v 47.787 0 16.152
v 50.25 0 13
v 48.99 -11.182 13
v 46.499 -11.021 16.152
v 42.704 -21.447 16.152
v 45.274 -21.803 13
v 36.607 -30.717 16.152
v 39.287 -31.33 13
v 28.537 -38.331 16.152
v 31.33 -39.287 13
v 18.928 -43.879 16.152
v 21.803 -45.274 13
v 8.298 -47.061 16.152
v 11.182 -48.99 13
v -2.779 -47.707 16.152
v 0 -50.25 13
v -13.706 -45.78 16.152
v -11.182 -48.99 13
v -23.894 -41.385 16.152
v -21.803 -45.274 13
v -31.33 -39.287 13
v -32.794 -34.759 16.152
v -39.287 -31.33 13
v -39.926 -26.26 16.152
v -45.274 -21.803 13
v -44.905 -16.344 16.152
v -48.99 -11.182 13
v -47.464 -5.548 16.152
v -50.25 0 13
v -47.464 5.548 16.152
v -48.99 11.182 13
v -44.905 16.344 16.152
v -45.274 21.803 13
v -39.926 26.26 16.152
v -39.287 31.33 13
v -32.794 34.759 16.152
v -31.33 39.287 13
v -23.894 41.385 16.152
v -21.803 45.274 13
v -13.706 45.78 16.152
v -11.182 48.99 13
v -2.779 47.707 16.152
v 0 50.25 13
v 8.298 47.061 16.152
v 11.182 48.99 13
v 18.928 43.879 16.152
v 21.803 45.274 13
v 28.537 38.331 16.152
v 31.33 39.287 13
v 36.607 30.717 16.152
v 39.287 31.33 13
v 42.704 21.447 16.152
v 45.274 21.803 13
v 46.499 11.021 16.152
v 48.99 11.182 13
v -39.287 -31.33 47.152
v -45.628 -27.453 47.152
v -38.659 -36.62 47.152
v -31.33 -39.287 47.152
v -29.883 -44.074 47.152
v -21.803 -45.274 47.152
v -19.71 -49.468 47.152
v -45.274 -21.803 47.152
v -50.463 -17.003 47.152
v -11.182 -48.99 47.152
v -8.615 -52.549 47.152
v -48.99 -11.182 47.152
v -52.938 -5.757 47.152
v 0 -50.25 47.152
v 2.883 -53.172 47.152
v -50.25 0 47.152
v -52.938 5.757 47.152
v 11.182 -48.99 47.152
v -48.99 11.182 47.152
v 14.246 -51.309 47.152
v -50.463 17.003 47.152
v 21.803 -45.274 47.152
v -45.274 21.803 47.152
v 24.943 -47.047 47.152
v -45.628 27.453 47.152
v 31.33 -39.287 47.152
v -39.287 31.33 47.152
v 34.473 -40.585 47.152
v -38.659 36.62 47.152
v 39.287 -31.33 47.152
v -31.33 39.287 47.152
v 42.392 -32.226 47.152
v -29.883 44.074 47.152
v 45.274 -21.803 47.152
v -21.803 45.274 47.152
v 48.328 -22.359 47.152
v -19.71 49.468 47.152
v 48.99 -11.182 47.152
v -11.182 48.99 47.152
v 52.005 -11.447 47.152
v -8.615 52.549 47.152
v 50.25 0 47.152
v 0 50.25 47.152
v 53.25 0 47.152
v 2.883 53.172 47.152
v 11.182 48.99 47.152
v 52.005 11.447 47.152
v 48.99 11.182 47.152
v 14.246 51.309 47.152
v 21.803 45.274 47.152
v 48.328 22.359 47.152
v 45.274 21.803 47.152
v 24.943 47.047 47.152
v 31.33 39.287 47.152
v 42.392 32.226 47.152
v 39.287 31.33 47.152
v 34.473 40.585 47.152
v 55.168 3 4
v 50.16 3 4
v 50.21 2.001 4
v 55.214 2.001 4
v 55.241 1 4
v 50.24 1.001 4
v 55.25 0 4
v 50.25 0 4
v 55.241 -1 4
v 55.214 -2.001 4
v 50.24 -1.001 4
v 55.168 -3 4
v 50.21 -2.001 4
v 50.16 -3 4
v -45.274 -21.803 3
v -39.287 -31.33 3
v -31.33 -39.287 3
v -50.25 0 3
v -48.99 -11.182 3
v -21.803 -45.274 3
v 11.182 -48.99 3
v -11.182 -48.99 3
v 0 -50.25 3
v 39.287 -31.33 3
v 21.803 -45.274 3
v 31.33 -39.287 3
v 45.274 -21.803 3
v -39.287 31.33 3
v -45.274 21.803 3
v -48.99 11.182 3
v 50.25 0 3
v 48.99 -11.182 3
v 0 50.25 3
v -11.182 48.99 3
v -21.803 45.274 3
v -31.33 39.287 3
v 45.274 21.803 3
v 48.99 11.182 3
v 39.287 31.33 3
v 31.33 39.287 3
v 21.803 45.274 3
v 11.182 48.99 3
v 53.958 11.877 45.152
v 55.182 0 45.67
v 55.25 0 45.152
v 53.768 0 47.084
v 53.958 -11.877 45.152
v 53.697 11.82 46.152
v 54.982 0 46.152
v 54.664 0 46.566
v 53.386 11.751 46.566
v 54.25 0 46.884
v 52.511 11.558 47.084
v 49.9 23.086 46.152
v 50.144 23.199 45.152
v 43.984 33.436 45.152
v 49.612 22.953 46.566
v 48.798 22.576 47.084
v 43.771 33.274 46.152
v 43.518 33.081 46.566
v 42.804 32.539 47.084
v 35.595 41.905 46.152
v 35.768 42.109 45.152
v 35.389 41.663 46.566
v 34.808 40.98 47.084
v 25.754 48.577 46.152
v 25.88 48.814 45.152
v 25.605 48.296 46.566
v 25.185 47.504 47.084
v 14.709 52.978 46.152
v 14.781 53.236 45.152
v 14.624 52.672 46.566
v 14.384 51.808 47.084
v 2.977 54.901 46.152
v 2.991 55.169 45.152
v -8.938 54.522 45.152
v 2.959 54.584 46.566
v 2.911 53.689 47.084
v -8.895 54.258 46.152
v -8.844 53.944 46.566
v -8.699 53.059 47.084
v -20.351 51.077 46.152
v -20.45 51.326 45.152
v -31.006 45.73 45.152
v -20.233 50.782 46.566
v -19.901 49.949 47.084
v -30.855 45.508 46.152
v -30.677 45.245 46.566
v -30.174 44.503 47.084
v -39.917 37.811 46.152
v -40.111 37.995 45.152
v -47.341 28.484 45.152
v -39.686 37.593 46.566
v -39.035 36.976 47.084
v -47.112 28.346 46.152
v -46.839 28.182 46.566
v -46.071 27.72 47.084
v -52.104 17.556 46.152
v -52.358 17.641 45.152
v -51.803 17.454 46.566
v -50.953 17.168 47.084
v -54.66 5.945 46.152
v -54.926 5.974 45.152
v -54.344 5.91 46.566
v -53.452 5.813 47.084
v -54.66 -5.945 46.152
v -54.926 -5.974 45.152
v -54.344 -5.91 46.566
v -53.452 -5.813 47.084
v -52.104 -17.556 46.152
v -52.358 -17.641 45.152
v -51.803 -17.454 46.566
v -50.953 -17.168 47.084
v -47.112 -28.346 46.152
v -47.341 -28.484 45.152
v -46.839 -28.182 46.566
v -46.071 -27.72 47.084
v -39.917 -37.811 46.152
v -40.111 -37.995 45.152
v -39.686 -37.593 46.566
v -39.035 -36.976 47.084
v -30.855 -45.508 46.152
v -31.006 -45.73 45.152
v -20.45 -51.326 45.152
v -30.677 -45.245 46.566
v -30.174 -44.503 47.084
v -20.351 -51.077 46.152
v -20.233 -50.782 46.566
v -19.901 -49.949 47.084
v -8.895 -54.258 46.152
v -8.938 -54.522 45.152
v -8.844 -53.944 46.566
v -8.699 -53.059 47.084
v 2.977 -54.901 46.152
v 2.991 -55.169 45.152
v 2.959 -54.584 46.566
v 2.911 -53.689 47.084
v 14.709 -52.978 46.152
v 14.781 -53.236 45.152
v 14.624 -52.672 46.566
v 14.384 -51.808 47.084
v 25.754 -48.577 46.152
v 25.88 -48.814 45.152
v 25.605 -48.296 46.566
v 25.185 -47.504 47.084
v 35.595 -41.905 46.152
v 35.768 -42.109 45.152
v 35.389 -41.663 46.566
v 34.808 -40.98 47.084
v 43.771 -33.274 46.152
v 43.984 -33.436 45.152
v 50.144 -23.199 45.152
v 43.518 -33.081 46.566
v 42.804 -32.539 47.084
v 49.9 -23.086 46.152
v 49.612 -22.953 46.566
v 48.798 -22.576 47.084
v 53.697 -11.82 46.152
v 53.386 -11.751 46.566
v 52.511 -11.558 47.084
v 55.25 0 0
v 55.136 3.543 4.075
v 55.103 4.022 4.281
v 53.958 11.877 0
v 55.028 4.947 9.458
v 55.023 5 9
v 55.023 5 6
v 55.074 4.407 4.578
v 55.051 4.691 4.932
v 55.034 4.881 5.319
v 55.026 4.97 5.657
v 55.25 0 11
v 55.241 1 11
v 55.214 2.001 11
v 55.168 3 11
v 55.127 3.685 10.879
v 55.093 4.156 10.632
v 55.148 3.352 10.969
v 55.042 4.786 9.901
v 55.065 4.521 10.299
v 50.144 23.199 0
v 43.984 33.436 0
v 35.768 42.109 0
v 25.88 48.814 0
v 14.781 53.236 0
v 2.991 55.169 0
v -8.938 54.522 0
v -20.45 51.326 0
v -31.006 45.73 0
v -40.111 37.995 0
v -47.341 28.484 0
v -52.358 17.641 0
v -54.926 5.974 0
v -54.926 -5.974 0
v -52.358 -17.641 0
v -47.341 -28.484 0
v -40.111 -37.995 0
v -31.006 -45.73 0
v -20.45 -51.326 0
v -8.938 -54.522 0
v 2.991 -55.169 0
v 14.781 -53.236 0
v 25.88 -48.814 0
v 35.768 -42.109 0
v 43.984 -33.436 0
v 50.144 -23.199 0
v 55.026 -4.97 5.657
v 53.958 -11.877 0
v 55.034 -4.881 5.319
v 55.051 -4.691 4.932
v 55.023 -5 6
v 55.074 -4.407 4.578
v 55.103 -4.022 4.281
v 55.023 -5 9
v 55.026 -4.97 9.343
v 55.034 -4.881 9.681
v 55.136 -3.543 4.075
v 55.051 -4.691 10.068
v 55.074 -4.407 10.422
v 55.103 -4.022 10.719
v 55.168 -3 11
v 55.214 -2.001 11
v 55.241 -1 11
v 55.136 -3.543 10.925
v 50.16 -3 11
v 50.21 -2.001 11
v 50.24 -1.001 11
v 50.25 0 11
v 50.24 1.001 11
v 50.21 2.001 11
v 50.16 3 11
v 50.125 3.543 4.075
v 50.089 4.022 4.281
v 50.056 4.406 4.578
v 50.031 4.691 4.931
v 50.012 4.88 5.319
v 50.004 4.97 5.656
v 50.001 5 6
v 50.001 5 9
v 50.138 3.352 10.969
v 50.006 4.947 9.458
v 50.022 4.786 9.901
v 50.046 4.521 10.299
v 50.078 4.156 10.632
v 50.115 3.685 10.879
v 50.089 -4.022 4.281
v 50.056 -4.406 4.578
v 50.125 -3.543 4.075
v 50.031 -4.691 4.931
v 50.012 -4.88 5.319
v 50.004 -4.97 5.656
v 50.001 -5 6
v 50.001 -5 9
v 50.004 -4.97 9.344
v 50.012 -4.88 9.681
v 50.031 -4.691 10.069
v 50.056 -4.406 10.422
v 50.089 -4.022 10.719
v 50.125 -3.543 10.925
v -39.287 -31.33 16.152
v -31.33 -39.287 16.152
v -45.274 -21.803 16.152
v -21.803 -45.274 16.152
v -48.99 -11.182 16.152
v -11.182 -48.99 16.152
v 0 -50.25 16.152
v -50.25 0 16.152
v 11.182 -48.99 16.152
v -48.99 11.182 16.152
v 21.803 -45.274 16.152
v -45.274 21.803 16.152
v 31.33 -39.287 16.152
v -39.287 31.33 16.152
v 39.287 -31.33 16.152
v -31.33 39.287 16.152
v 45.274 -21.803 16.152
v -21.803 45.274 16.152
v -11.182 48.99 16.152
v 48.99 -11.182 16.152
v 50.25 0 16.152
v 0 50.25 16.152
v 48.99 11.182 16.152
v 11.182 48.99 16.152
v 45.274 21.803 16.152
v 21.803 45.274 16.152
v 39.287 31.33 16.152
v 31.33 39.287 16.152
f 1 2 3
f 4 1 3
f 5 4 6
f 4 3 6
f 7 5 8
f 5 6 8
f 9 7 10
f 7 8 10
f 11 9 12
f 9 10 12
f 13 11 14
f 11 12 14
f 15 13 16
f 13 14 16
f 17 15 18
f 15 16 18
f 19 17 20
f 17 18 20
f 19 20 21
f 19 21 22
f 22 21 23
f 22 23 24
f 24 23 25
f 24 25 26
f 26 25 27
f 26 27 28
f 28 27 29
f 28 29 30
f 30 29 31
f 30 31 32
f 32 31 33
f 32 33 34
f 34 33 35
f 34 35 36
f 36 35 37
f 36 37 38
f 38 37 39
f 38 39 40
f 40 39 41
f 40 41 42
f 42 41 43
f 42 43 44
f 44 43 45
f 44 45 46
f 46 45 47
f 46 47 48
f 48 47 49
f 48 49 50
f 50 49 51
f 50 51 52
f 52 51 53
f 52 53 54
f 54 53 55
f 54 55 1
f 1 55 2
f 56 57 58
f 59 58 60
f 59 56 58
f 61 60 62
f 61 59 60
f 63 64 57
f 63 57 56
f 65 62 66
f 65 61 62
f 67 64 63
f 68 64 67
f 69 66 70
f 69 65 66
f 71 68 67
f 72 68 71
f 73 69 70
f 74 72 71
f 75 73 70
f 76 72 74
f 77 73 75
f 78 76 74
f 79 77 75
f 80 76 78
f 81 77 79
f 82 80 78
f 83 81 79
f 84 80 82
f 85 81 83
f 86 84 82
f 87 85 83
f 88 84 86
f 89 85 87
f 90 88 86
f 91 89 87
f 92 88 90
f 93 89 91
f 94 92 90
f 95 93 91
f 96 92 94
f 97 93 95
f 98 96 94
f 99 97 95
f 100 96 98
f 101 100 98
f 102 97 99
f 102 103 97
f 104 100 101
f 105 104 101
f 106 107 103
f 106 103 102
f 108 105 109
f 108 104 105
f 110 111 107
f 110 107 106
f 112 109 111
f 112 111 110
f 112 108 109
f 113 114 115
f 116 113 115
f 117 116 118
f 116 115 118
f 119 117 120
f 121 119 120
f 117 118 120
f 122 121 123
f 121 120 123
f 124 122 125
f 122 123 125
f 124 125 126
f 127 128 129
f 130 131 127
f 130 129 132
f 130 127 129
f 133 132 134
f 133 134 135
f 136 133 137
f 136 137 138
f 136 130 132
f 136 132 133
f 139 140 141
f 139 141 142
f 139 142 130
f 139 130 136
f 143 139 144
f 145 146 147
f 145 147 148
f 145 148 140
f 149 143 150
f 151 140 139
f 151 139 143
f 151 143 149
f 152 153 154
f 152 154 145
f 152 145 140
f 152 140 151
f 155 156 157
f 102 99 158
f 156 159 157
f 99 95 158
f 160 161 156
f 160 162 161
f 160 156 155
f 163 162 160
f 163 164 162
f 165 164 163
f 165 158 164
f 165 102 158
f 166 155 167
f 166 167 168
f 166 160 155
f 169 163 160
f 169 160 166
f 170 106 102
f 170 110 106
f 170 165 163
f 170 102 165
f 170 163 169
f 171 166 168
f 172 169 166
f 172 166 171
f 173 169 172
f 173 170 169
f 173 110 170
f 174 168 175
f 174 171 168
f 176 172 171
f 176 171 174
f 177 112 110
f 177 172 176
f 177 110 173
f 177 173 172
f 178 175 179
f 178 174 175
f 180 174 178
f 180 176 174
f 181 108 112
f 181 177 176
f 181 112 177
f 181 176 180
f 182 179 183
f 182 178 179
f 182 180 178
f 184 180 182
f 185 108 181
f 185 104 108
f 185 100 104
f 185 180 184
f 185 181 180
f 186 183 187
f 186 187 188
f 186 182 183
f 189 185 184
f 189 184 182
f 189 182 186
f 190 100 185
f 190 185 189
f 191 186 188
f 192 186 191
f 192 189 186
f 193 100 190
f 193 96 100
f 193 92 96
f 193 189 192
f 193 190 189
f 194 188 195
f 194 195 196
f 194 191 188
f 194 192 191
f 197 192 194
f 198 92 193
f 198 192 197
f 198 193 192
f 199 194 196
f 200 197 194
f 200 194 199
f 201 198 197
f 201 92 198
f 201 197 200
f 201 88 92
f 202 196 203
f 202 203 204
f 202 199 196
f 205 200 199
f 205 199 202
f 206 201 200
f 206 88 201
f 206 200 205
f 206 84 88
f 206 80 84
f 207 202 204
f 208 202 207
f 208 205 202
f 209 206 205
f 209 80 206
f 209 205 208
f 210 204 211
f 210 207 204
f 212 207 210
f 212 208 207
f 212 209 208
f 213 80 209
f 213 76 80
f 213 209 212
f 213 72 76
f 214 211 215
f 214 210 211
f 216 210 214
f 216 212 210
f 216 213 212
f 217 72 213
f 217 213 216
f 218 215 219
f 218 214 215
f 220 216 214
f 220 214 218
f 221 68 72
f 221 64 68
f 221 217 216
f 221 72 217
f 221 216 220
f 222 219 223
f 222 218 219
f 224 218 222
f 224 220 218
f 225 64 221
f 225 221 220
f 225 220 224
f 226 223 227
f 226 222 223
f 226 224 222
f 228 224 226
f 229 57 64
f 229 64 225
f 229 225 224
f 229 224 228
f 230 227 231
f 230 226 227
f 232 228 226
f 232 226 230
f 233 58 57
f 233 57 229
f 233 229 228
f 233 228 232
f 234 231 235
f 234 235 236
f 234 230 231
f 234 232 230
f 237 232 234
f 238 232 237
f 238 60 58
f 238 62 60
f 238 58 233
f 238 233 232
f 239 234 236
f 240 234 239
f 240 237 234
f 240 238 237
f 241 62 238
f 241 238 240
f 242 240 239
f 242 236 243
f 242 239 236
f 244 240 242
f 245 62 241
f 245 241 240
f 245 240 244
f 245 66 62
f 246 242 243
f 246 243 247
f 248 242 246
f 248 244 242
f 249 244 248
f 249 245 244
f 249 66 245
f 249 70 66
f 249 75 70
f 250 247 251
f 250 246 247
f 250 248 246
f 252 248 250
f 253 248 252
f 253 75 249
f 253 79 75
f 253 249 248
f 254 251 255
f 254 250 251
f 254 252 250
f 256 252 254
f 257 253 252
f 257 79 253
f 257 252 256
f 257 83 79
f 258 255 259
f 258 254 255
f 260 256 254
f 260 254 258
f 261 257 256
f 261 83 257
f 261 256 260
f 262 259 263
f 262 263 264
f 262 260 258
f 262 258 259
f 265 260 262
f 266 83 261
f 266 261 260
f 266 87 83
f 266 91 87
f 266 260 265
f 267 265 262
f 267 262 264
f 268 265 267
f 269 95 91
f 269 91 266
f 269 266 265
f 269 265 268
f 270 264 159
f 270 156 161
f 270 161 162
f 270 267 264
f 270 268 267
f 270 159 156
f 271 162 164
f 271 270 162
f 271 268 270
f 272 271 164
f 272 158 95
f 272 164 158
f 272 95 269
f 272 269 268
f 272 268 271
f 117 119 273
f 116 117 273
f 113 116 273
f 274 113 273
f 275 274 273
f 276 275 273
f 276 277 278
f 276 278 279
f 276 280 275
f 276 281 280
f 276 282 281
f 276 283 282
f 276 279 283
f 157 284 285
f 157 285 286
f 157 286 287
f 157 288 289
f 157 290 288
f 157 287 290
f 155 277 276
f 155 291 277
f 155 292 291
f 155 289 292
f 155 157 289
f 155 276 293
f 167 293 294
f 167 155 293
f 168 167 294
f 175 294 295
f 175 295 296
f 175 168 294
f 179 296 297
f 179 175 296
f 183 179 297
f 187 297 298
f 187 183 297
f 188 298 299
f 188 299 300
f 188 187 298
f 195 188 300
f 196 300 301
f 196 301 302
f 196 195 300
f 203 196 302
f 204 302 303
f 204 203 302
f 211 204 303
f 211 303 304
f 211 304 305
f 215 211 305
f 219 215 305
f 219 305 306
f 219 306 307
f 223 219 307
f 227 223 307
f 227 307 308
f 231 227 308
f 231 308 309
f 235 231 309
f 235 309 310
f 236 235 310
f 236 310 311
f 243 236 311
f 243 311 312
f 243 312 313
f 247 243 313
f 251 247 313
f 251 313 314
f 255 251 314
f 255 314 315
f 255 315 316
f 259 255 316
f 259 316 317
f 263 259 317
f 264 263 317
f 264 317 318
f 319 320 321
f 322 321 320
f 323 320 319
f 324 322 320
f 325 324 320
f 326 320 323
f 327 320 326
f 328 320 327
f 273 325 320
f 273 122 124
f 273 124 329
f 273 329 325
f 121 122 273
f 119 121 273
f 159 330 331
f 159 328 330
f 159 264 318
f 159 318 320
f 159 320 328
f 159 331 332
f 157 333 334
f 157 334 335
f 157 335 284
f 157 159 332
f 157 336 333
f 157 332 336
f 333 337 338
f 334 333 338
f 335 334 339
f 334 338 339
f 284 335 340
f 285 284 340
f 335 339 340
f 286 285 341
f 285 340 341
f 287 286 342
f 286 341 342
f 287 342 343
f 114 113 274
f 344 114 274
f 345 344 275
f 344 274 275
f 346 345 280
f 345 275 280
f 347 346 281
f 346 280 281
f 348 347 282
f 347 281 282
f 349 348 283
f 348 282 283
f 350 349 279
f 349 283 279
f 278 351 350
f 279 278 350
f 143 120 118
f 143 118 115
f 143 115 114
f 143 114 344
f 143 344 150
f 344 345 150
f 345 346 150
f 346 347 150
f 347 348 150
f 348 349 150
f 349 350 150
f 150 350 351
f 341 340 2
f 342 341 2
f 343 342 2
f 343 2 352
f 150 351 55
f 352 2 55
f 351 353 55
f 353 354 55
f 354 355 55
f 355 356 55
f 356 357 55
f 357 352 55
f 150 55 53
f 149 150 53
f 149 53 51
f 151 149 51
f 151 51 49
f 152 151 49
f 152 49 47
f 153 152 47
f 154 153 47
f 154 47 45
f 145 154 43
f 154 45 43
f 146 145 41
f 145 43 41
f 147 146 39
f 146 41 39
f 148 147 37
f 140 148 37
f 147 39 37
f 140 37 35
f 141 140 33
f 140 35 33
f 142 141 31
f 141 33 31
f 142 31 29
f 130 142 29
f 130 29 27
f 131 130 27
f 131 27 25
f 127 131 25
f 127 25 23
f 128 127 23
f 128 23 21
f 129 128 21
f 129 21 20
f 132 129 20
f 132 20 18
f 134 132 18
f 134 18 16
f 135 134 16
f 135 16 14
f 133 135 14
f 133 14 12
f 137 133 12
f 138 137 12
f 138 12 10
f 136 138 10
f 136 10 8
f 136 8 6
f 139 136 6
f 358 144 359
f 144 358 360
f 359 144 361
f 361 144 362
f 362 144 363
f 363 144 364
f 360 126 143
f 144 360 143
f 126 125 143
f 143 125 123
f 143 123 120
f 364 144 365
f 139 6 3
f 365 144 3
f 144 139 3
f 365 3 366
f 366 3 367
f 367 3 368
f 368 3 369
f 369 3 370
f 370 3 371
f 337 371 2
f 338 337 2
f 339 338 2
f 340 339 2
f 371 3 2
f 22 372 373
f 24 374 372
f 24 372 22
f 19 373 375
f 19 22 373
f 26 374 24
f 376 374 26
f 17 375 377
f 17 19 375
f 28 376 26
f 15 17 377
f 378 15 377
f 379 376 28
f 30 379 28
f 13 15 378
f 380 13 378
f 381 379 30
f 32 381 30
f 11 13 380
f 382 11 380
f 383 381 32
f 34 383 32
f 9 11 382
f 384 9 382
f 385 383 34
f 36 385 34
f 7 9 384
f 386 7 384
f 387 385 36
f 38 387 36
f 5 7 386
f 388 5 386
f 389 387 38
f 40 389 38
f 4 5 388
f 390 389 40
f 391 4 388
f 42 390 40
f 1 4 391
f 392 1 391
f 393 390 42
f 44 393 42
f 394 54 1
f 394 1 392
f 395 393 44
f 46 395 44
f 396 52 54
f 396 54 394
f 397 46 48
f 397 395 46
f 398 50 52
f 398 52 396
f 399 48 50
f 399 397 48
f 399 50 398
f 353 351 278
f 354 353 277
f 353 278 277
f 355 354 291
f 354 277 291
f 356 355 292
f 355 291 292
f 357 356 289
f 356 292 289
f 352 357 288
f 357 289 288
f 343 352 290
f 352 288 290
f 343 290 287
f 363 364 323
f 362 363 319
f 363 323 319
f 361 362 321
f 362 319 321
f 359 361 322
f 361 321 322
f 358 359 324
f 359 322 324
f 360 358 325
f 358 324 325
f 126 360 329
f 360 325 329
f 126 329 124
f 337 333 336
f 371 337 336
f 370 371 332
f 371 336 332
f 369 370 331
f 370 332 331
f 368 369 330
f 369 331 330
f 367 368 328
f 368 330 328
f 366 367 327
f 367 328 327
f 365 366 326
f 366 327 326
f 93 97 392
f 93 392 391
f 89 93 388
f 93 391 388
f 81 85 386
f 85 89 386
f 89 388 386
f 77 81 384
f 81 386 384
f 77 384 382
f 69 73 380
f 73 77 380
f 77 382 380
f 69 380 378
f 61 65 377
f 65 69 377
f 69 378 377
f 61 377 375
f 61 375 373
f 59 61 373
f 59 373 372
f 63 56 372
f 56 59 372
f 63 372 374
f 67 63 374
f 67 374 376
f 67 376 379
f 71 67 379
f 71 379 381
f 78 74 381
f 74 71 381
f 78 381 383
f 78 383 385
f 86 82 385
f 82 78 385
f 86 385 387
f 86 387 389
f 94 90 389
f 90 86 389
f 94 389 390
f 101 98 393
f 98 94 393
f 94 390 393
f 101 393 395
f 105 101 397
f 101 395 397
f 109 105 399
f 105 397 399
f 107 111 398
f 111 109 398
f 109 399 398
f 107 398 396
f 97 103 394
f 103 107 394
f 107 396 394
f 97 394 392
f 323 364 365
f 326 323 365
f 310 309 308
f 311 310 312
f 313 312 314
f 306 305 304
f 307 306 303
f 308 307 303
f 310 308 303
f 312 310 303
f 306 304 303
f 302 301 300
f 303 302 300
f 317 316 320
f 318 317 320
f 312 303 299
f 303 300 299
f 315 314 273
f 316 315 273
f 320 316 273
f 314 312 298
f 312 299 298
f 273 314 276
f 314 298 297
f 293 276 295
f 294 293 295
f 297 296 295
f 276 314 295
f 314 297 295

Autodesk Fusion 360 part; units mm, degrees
ref_plane "WorkPlane3" through (50, 0, 0) normal (1, 0, 0) x (0, 1, 0) in component "Container"
sketch "Sketch6" plane through (0, 0, 0) normal (0, 1, 0) x (1, 0, 0) in component "Container"
  line L0 (0, 0) -> (55.25, 0)
  line L1 (55.25, 0) -> (55.25, -3)
  line L2 (55.25, -3) -> (0, -3)
  line L3 (0, -3) -> (0, 0)
  line L4 (50.25, -13) -> (55.25, -13)
  line L5 (55.25, -13) -> (55.25, -3)
  line L6 (55.25, -3) -> (50.25, -3)
  line L7 (50.25, -3) -> (50.25, -13)
  line L8 (50.25, -13) -> (104.5, -13) construction
  line L9 (50.25, -13) -> (47.7874, -16.152)
  line L10 (50.25, -13) -> (104.5, -13) construction
  line L11 (47.7874, -16.152) -> (55.25, -16.152)
  line L12 (55.25, -13) -> (55.25, -16.152)
  line L13 (50.25, -13) -> (50.25, -16.152) construction
  line L14 (50.25, -16.152) -> (55.25, -16.152)
  line L15 (55.25, -16.152) -> (55.25, -47.152)
  line L16 (55.25, -47.152) -> (50.25, -47.152)
  line L17 (50.25, -47.152) -> (50.25, -16.152)
  dimension "d44" = 55.25
  dimension "d45" = 3
  dimension "d47" = 10
  dimension "d48" = 10
  dimension "d49" = 5
  dimension "d50" = 5
  dimension "d53" = 128
  dimension "d54" = 4
  dimension "d56" = 3.152
  dimension "d57" = 5
  dimension "d58" = 31
revolve "Revolve1" add sketch "Sketch6" angle 360 about axis through (0, 0, 1.75) along (0, 0, 1) makes body 1 in component "Container"
fillet "Fillet2" radius 2 1 edges at (-51.5111, -19.9793, 47.152) on bodies 1 in component "Container"
copy_body "CutPasteBodies1" bodies 1 removing the originals makes body 2 in component "Container"
sketch "Sketch8" plane through (50, 0, 0) normal (1, 0, 0) x (0, 1, 0)
  line L0 (-5, 11) -> (5, 11)
  line L1 (5, 11) -> (5, 4)
  line L2 (5, 4) -> (-5, 4)
  line L3 (-5, 4) -> (-5, 11)
  dimension "d71" = 7
  dimension "d72" = 10
  dimension "d73" = 5
  dimension "d74" = 4
extrude "Extrude1" cut sketch "Sketch8" along normal blind 17 bodies 2 in component "Container"
fillet "Fillet1" radius 2 4 edges at (52.512, -5, 11) (52.512, 5, 11) (52.512, -5, 4) (52.512, 5, 4) on bodies 2 in component "Container"
component "Container" placed x (1, 0, 0) y (0, 1, 0) z (0, 0, 1) at (0, 0, 0)
equation "d44 = ( 100.5 / 2 ) * 1 mm + d49"
equation "d48 = d47"
equation "d50 = d49"
equation "d53 = 90 deg + 38 deg"
equation "d57 = d49"
equation "d73 = d72 / 2"
equation "d74 = 3.00 mm + 1 mm"
